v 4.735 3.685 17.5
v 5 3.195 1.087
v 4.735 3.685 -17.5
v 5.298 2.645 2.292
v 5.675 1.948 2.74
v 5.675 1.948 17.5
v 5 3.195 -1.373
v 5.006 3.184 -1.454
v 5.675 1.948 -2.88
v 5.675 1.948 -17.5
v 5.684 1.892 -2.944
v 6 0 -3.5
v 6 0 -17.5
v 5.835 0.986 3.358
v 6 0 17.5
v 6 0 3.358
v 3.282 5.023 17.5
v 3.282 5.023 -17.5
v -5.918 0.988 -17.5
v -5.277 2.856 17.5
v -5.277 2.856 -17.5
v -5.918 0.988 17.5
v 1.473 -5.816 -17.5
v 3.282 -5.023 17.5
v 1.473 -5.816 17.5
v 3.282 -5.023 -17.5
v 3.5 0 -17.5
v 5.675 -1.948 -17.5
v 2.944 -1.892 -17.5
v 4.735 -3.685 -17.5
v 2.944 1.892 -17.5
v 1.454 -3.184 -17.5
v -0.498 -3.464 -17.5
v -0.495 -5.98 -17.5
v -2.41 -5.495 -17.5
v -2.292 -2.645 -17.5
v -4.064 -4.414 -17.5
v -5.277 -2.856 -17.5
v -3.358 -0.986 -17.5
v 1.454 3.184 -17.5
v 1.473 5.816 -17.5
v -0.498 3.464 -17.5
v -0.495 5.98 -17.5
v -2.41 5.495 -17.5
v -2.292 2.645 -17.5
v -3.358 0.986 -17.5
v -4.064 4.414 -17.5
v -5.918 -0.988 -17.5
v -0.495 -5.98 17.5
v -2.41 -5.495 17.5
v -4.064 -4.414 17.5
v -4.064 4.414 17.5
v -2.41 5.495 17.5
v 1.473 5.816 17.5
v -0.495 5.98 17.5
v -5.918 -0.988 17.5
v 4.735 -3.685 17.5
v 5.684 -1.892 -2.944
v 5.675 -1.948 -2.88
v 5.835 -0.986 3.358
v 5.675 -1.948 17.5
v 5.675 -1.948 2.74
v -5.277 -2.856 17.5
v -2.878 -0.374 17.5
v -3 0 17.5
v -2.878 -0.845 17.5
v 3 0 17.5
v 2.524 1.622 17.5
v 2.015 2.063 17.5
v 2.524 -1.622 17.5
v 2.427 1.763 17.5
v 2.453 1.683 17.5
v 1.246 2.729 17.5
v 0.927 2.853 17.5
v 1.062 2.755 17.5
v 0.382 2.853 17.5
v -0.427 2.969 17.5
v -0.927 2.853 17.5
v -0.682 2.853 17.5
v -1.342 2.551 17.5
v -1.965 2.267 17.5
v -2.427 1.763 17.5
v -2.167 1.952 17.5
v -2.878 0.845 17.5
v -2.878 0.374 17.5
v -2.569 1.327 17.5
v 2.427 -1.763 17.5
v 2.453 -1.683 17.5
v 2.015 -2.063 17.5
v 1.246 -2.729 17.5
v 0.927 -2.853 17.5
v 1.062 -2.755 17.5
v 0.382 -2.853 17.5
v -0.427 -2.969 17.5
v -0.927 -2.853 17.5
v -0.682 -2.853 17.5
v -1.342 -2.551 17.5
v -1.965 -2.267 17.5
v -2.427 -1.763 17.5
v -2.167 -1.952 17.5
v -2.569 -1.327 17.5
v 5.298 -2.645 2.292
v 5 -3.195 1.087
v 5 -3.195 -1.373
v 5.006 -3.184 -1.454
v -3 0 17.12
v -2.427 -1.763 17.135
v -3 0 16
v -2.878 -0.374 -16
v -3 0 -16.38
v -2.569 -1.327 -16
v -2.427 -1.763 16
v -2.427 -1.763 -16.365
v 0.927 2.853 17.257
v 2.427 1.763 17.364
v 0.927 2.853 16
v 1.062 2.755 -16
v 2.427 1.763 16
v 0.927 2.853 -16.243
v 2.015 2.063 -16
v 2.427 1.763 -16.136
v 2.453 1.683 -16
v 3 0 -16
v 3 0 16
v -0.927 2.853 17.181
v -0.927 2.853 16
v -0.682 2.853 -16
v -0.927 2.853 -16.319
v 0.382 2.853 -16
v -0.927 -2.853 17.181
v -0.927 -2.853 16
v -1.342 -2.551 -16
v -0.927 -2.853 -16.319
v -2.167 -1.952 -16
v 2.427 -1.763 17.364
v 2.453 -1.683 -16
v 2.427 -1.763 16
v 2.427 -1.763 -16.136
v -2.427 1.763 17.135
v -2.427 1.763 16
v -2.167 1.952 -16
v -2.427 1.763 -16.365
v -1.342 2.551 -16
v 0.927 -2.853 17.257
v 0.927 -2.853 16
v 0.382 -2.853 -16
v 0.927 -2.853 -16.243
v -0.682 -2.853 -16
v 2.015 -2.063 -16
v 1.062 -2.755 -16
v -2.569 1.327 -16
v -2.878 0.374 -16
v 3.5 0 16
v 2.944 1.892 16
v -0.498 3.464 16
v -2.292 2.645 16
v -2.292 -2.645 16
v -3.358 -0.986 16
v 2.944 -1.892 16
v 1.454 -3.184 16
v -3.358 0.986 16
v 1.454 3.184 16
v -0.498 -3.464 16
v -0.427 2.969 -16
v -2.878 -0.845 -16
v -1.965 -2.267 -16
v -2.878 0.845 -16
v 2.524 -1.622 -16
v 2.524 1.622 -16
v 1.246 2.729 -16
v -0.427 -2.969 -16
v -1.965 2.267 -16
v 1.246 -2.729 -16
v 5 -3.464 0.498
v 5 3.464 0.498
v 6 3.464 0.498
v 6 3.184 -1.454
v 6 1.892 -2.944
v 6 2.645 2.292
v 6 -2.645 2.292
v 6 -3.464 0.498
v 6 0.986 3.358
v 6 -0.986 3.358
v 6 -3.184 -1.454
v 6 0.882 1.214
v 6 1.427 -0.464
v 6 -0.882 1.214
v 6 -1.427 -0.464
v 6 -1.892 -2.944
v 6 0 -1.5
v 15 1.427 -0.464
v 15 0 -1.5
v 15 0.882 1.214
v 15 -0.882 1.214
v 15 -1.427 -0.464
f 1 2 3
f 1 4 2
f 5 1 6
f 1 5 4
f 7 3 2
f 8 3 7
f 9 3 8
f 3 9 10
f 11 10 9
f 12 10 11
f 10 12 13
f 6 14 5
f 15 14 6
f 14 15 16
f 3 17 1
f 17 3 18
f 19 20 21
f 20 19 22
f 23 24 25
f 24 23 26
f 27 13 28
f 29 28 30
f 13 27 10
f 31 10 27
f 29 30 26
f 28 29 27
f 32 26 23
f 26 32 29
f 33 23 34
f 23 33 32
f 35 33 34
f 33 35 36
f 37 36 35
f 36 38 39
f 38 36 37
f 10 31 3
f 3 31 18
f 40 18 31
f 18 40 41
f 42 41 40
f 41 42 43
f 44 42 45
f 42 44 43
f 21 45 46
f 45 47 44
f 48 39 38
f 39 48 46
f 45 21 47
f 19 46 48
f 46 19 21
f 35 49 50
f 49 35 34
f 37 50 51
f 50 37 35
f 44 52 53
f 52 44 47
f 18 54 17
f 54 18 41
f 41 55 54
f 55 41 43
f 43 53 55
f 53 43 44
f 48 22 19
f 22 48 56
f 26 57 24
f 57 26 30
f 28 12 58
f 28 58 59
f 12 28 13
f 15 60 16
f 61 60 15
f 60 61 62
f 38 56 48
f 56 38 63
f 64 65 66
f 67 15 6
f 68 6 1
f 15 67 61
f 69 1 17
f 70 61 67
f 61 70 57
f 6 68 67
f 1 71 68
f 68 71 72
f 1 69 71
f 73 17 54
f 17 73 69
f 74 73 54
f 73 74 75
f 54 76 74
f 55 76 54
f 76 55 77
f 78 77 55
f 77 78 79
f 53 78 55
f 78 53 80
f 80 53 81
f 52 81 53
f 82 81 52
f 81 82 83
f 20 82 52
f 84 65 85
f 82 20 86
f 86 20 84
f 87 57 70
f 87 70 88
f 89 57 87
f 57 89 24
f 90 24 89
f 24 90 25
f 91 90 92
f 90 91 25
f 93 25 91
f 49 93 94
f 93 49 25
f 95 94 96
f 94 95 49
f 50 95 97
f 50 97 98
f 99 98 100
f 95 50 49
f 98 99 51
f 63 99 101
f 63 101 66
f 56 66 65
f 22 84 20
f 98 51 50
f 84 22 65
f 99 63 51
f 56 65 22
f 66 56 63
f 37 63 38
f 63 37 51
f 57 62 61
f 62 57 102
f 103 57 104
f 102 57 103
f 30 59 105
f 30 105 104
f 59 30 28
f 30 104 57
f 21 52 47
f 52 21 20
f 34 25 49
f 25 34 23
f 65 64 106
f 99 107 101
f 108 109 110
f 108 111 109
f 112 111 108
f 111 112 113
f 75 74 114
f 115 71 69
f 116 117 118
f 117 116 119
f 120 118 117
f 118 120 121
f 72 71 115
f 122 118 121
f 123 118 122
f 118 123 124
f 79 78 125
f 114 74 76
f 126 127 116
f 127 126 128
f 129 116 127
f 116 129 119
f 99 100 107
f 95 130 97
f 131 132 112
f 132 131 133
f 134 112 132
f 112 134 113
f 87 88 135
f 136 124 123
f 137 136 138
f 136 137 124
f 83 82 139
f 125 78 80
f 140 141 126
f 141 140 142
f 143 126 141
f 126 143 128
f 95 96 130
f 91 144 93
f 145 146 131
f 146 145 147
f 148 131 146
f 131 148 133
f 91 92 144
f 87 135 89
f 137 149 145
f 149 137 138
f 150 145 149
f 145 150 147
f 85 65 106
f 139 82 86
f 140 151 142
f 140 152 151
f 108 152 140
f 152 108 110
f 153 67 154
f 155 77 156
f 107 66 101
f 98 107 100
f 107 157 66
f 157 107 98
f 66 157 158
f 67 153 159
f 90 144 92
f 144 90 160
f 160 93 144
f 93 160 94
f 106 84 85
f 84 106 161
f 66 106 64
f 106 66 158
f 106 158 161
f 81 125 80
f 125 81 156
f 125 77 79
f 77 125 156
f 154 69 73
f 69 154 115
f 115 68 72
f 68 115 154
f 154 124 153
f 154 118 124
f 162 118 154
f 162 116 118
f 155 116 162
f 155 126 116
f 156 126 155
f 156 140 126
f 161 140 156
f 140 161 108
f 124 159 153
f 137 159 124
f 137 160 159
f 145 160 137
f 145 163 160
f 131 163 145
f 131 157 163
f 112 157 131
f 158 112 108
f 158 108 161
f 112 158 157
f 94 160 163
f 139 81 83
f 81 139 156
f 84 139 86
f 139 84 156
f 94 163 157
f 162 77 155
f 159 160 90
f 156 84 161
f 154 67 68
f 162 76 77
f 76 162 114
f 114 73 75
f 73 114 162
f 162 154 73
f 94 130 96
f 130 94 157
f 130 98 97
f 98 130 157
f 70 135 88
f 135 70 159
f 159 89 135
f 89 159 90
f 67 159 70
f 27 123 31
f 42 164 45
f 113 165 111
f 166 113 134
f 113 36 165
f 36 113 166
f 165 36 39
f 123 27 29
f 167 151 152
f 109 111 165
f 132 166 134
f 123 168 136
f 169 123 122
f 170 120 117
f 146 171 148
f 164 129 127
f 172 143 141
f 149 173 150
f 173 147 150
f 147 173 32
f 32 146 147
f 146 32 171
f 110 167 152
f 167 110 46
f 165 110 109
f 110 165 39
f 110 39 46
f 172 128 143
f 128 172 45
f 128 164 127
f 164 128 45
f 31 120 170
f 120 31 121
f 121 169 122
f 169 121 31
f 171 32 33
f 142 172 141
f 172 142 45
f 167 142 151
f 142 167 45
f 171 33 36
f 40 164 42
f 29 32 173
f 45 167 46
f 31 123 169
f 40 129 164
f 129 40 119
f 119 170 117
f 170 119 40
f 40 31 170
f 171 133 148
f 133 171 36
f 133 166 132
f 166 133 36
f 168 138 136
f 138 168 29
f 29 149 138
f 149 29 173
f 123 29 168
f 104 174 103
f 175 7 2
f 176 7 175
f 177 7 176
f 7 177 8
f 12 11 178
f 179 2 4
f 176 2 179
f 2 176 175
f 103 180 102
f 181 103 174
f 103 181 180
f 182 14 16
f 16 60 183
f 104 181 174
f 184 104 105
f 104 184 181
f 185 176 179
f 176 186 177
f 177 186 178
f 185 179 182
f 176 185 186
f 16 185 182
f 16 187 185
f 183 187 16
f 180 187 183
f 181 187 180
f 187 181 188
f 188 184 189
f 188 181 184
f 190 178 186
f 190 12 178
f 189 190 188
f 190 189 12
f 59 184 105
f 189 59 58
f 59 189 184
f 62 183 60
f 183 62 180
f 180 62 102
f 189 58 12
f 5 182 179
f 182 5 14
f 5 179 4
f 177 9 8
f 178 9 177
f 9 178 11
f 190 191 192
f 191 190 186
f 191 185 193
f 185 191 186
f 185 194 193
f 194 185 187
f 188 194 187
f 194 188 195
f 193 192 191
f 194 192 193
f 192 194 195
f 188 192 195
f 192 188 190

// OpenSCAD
// Parameters
bore_diameter_mm = 6; //[3:12:0.1]
outer_diameter_mm = 12; //[6:24:0.1]
length_mm = 35; //[18:70:0.5]
wall_thickness_mm = 3; //[1.5:6:0.1]
end_chamfer_mm = 0.5; //[0:2:0.1]
connect_overlap_mm = 1; //[0.5:2:0.1]
screw_shank_diameter_mm = 3; //[2:6:0.1]
screw_length_mm = 10; //[5:25:0.5]
screw_head_diameter_mm = 6; //[4:12:0.1]
screw_head_height_mm = 2.5; //[1.5:6:0.1]
washer_outer_diameter_mm = 7; //[5:16:0.1]
washer_thickness_mm = 1; //[0.5:3:0.1]

// Linear Bearing - complete geometry
module linear_bearing() {
  color([0.85, 0.85, 0.8]) {
    difference() {
      // Outer casing
      cylinder(h=length_mm, r=outer_diameter_mm/2, center=true);

      // Inner bore
      cylinder(h=length_mm + 2*connect_overlap_mm, r=bore_diameter_mm/2, center=true);

      // End chamfers
      translate([0, 0, length_mm/2 - (end_chamfer_mm + connect_overlap_mm)/2])
        cylinder(h=end_chamfer_mm + connect_overlap_mm,
                 r1=bore_diameter_mm/2 + end_chamfer_mm, r2=bore_diameter_mm/2, center=true);

      translate([0, 0, -length_mm/2 + (end_chamfer_mm + connect_overlap_mm)/2])
        cylinder(h=end_chamfer_mm + connect_overlap_mm,
                 r1=bore_diameter_mm/2 + end_chamfer_mm, r2=bore_diameter_mm/2, center=true);
    }
  }
}

// Screw and Washer - complete geometry, positioned to OVERLAP the bearing by connect_overlap_mm
module screw_and_washer() {
  // Coordinate system:
  // Bearing is centered at origin, axis along Z.
  // Screw axis is along +X (via rotate([0,90,0])).
  // Ensure physical connection by pushing washer/screw into the bearing by connect_overlap_mm.
  //
  // Bearing outer surface is at x = outer_diameter_mm/2.
  // Washer spans along X by washer_thickness_mm (centered), so its inner face is at:
  //   x = washer_center_x - washer_thickness_mm/2
  // We want that inner face to be inside the bearing by connect_overlap_mm:
  //   washer_center_x - washer_thickness_mm/2 = outer_diameter_mm/2 - connect_overlap_mm
  // => washer_center_x = outer_diameter_mm/2 + washer_thickness_mm/2 - connect_overlap_mm

  washer_center_x = outer_diameter_mm/2 + washer_thickness_mm/2 - connect_overlap_mm;

  // Place screw shank so it overlaps the washer by connect_overlap_mm (guaranteed fusion)
  // Washer outer face is at x = washer_center_x + washer_thickness_mm/2
  // Shank spans along X by screw_length_mm (centered), so its left face is at:
  //   x = shank_center_x - screw_length_mm/2
  // Want: shank_left_face = washer_outer_face - connect_overlap_mm
  // => shank_center_x = washer_outer_face - connect_overlap_mm + screw_length_mm/2
  shank_center_x = (washer_center_x + washer_thickness_mm/2) - connect_overlap_mm + screw_length_mm/2;

  // Place screw head so it overlaps the washer by connect_overlap_mm (guaranteed fusion)
  // Head spans along X by screw_head_height_mm (centered), so its right face is at:
  //   x = head_center_x + screw_head_height_mm/2
  // Want: head_right_face = washer_inner_face + connect_overlap_mm
  // washer_inner_face = washer_center_x - washer_thickness_mm/2
  // => head_center_x = washer_inner_face + connect_overlap_mm - screw_head_height_mm/2
  head_center_x = (washer_center_x - washer_thickness_mm/2) + connect_overlap_mm - screw_head_height_mm/2;

  color([0.4, 0.4, 0.43]) {
    union() {
      // Washer
      difference() {
        translate([washer_center_x, 0, 0])
          rotate([0, 90, 0])
          cylinder(h=washer_thickness_mm, r=washer_outer_diameter_mm/2, center=true);

        translate([washer_center_x, 0, 0])
          rotate([0, 90, 0])
          cylinder(h=washer_thickness_mm + 2*connect_overlap_mm, r=screw_shank_diameter_mm/2, center=true);
      }

      // Screw shank (overlaps washer by connect_overlap_mm)
      translate([shank_center_x, 0, 0])
        rotate([0, 90, 0])
        cylinder(h=screw_length_mm, r=screw_shank_diameter_mm/2, center=true);

      // Screw head (overlaps washer by connect_overlap_mm)
      translate([head_center_x, 0, 0])
        rotate([0, 90, 0])
        cylinder(h=screw_head_height_mm, r=screw_head_diameter_mm/2, center=true);
    }
  }
}

// Assembly - single connected solid via union()
module assembly() {
  union() {
    linear_bearing();
    screw_and_washer();
  }
}

assembly();
